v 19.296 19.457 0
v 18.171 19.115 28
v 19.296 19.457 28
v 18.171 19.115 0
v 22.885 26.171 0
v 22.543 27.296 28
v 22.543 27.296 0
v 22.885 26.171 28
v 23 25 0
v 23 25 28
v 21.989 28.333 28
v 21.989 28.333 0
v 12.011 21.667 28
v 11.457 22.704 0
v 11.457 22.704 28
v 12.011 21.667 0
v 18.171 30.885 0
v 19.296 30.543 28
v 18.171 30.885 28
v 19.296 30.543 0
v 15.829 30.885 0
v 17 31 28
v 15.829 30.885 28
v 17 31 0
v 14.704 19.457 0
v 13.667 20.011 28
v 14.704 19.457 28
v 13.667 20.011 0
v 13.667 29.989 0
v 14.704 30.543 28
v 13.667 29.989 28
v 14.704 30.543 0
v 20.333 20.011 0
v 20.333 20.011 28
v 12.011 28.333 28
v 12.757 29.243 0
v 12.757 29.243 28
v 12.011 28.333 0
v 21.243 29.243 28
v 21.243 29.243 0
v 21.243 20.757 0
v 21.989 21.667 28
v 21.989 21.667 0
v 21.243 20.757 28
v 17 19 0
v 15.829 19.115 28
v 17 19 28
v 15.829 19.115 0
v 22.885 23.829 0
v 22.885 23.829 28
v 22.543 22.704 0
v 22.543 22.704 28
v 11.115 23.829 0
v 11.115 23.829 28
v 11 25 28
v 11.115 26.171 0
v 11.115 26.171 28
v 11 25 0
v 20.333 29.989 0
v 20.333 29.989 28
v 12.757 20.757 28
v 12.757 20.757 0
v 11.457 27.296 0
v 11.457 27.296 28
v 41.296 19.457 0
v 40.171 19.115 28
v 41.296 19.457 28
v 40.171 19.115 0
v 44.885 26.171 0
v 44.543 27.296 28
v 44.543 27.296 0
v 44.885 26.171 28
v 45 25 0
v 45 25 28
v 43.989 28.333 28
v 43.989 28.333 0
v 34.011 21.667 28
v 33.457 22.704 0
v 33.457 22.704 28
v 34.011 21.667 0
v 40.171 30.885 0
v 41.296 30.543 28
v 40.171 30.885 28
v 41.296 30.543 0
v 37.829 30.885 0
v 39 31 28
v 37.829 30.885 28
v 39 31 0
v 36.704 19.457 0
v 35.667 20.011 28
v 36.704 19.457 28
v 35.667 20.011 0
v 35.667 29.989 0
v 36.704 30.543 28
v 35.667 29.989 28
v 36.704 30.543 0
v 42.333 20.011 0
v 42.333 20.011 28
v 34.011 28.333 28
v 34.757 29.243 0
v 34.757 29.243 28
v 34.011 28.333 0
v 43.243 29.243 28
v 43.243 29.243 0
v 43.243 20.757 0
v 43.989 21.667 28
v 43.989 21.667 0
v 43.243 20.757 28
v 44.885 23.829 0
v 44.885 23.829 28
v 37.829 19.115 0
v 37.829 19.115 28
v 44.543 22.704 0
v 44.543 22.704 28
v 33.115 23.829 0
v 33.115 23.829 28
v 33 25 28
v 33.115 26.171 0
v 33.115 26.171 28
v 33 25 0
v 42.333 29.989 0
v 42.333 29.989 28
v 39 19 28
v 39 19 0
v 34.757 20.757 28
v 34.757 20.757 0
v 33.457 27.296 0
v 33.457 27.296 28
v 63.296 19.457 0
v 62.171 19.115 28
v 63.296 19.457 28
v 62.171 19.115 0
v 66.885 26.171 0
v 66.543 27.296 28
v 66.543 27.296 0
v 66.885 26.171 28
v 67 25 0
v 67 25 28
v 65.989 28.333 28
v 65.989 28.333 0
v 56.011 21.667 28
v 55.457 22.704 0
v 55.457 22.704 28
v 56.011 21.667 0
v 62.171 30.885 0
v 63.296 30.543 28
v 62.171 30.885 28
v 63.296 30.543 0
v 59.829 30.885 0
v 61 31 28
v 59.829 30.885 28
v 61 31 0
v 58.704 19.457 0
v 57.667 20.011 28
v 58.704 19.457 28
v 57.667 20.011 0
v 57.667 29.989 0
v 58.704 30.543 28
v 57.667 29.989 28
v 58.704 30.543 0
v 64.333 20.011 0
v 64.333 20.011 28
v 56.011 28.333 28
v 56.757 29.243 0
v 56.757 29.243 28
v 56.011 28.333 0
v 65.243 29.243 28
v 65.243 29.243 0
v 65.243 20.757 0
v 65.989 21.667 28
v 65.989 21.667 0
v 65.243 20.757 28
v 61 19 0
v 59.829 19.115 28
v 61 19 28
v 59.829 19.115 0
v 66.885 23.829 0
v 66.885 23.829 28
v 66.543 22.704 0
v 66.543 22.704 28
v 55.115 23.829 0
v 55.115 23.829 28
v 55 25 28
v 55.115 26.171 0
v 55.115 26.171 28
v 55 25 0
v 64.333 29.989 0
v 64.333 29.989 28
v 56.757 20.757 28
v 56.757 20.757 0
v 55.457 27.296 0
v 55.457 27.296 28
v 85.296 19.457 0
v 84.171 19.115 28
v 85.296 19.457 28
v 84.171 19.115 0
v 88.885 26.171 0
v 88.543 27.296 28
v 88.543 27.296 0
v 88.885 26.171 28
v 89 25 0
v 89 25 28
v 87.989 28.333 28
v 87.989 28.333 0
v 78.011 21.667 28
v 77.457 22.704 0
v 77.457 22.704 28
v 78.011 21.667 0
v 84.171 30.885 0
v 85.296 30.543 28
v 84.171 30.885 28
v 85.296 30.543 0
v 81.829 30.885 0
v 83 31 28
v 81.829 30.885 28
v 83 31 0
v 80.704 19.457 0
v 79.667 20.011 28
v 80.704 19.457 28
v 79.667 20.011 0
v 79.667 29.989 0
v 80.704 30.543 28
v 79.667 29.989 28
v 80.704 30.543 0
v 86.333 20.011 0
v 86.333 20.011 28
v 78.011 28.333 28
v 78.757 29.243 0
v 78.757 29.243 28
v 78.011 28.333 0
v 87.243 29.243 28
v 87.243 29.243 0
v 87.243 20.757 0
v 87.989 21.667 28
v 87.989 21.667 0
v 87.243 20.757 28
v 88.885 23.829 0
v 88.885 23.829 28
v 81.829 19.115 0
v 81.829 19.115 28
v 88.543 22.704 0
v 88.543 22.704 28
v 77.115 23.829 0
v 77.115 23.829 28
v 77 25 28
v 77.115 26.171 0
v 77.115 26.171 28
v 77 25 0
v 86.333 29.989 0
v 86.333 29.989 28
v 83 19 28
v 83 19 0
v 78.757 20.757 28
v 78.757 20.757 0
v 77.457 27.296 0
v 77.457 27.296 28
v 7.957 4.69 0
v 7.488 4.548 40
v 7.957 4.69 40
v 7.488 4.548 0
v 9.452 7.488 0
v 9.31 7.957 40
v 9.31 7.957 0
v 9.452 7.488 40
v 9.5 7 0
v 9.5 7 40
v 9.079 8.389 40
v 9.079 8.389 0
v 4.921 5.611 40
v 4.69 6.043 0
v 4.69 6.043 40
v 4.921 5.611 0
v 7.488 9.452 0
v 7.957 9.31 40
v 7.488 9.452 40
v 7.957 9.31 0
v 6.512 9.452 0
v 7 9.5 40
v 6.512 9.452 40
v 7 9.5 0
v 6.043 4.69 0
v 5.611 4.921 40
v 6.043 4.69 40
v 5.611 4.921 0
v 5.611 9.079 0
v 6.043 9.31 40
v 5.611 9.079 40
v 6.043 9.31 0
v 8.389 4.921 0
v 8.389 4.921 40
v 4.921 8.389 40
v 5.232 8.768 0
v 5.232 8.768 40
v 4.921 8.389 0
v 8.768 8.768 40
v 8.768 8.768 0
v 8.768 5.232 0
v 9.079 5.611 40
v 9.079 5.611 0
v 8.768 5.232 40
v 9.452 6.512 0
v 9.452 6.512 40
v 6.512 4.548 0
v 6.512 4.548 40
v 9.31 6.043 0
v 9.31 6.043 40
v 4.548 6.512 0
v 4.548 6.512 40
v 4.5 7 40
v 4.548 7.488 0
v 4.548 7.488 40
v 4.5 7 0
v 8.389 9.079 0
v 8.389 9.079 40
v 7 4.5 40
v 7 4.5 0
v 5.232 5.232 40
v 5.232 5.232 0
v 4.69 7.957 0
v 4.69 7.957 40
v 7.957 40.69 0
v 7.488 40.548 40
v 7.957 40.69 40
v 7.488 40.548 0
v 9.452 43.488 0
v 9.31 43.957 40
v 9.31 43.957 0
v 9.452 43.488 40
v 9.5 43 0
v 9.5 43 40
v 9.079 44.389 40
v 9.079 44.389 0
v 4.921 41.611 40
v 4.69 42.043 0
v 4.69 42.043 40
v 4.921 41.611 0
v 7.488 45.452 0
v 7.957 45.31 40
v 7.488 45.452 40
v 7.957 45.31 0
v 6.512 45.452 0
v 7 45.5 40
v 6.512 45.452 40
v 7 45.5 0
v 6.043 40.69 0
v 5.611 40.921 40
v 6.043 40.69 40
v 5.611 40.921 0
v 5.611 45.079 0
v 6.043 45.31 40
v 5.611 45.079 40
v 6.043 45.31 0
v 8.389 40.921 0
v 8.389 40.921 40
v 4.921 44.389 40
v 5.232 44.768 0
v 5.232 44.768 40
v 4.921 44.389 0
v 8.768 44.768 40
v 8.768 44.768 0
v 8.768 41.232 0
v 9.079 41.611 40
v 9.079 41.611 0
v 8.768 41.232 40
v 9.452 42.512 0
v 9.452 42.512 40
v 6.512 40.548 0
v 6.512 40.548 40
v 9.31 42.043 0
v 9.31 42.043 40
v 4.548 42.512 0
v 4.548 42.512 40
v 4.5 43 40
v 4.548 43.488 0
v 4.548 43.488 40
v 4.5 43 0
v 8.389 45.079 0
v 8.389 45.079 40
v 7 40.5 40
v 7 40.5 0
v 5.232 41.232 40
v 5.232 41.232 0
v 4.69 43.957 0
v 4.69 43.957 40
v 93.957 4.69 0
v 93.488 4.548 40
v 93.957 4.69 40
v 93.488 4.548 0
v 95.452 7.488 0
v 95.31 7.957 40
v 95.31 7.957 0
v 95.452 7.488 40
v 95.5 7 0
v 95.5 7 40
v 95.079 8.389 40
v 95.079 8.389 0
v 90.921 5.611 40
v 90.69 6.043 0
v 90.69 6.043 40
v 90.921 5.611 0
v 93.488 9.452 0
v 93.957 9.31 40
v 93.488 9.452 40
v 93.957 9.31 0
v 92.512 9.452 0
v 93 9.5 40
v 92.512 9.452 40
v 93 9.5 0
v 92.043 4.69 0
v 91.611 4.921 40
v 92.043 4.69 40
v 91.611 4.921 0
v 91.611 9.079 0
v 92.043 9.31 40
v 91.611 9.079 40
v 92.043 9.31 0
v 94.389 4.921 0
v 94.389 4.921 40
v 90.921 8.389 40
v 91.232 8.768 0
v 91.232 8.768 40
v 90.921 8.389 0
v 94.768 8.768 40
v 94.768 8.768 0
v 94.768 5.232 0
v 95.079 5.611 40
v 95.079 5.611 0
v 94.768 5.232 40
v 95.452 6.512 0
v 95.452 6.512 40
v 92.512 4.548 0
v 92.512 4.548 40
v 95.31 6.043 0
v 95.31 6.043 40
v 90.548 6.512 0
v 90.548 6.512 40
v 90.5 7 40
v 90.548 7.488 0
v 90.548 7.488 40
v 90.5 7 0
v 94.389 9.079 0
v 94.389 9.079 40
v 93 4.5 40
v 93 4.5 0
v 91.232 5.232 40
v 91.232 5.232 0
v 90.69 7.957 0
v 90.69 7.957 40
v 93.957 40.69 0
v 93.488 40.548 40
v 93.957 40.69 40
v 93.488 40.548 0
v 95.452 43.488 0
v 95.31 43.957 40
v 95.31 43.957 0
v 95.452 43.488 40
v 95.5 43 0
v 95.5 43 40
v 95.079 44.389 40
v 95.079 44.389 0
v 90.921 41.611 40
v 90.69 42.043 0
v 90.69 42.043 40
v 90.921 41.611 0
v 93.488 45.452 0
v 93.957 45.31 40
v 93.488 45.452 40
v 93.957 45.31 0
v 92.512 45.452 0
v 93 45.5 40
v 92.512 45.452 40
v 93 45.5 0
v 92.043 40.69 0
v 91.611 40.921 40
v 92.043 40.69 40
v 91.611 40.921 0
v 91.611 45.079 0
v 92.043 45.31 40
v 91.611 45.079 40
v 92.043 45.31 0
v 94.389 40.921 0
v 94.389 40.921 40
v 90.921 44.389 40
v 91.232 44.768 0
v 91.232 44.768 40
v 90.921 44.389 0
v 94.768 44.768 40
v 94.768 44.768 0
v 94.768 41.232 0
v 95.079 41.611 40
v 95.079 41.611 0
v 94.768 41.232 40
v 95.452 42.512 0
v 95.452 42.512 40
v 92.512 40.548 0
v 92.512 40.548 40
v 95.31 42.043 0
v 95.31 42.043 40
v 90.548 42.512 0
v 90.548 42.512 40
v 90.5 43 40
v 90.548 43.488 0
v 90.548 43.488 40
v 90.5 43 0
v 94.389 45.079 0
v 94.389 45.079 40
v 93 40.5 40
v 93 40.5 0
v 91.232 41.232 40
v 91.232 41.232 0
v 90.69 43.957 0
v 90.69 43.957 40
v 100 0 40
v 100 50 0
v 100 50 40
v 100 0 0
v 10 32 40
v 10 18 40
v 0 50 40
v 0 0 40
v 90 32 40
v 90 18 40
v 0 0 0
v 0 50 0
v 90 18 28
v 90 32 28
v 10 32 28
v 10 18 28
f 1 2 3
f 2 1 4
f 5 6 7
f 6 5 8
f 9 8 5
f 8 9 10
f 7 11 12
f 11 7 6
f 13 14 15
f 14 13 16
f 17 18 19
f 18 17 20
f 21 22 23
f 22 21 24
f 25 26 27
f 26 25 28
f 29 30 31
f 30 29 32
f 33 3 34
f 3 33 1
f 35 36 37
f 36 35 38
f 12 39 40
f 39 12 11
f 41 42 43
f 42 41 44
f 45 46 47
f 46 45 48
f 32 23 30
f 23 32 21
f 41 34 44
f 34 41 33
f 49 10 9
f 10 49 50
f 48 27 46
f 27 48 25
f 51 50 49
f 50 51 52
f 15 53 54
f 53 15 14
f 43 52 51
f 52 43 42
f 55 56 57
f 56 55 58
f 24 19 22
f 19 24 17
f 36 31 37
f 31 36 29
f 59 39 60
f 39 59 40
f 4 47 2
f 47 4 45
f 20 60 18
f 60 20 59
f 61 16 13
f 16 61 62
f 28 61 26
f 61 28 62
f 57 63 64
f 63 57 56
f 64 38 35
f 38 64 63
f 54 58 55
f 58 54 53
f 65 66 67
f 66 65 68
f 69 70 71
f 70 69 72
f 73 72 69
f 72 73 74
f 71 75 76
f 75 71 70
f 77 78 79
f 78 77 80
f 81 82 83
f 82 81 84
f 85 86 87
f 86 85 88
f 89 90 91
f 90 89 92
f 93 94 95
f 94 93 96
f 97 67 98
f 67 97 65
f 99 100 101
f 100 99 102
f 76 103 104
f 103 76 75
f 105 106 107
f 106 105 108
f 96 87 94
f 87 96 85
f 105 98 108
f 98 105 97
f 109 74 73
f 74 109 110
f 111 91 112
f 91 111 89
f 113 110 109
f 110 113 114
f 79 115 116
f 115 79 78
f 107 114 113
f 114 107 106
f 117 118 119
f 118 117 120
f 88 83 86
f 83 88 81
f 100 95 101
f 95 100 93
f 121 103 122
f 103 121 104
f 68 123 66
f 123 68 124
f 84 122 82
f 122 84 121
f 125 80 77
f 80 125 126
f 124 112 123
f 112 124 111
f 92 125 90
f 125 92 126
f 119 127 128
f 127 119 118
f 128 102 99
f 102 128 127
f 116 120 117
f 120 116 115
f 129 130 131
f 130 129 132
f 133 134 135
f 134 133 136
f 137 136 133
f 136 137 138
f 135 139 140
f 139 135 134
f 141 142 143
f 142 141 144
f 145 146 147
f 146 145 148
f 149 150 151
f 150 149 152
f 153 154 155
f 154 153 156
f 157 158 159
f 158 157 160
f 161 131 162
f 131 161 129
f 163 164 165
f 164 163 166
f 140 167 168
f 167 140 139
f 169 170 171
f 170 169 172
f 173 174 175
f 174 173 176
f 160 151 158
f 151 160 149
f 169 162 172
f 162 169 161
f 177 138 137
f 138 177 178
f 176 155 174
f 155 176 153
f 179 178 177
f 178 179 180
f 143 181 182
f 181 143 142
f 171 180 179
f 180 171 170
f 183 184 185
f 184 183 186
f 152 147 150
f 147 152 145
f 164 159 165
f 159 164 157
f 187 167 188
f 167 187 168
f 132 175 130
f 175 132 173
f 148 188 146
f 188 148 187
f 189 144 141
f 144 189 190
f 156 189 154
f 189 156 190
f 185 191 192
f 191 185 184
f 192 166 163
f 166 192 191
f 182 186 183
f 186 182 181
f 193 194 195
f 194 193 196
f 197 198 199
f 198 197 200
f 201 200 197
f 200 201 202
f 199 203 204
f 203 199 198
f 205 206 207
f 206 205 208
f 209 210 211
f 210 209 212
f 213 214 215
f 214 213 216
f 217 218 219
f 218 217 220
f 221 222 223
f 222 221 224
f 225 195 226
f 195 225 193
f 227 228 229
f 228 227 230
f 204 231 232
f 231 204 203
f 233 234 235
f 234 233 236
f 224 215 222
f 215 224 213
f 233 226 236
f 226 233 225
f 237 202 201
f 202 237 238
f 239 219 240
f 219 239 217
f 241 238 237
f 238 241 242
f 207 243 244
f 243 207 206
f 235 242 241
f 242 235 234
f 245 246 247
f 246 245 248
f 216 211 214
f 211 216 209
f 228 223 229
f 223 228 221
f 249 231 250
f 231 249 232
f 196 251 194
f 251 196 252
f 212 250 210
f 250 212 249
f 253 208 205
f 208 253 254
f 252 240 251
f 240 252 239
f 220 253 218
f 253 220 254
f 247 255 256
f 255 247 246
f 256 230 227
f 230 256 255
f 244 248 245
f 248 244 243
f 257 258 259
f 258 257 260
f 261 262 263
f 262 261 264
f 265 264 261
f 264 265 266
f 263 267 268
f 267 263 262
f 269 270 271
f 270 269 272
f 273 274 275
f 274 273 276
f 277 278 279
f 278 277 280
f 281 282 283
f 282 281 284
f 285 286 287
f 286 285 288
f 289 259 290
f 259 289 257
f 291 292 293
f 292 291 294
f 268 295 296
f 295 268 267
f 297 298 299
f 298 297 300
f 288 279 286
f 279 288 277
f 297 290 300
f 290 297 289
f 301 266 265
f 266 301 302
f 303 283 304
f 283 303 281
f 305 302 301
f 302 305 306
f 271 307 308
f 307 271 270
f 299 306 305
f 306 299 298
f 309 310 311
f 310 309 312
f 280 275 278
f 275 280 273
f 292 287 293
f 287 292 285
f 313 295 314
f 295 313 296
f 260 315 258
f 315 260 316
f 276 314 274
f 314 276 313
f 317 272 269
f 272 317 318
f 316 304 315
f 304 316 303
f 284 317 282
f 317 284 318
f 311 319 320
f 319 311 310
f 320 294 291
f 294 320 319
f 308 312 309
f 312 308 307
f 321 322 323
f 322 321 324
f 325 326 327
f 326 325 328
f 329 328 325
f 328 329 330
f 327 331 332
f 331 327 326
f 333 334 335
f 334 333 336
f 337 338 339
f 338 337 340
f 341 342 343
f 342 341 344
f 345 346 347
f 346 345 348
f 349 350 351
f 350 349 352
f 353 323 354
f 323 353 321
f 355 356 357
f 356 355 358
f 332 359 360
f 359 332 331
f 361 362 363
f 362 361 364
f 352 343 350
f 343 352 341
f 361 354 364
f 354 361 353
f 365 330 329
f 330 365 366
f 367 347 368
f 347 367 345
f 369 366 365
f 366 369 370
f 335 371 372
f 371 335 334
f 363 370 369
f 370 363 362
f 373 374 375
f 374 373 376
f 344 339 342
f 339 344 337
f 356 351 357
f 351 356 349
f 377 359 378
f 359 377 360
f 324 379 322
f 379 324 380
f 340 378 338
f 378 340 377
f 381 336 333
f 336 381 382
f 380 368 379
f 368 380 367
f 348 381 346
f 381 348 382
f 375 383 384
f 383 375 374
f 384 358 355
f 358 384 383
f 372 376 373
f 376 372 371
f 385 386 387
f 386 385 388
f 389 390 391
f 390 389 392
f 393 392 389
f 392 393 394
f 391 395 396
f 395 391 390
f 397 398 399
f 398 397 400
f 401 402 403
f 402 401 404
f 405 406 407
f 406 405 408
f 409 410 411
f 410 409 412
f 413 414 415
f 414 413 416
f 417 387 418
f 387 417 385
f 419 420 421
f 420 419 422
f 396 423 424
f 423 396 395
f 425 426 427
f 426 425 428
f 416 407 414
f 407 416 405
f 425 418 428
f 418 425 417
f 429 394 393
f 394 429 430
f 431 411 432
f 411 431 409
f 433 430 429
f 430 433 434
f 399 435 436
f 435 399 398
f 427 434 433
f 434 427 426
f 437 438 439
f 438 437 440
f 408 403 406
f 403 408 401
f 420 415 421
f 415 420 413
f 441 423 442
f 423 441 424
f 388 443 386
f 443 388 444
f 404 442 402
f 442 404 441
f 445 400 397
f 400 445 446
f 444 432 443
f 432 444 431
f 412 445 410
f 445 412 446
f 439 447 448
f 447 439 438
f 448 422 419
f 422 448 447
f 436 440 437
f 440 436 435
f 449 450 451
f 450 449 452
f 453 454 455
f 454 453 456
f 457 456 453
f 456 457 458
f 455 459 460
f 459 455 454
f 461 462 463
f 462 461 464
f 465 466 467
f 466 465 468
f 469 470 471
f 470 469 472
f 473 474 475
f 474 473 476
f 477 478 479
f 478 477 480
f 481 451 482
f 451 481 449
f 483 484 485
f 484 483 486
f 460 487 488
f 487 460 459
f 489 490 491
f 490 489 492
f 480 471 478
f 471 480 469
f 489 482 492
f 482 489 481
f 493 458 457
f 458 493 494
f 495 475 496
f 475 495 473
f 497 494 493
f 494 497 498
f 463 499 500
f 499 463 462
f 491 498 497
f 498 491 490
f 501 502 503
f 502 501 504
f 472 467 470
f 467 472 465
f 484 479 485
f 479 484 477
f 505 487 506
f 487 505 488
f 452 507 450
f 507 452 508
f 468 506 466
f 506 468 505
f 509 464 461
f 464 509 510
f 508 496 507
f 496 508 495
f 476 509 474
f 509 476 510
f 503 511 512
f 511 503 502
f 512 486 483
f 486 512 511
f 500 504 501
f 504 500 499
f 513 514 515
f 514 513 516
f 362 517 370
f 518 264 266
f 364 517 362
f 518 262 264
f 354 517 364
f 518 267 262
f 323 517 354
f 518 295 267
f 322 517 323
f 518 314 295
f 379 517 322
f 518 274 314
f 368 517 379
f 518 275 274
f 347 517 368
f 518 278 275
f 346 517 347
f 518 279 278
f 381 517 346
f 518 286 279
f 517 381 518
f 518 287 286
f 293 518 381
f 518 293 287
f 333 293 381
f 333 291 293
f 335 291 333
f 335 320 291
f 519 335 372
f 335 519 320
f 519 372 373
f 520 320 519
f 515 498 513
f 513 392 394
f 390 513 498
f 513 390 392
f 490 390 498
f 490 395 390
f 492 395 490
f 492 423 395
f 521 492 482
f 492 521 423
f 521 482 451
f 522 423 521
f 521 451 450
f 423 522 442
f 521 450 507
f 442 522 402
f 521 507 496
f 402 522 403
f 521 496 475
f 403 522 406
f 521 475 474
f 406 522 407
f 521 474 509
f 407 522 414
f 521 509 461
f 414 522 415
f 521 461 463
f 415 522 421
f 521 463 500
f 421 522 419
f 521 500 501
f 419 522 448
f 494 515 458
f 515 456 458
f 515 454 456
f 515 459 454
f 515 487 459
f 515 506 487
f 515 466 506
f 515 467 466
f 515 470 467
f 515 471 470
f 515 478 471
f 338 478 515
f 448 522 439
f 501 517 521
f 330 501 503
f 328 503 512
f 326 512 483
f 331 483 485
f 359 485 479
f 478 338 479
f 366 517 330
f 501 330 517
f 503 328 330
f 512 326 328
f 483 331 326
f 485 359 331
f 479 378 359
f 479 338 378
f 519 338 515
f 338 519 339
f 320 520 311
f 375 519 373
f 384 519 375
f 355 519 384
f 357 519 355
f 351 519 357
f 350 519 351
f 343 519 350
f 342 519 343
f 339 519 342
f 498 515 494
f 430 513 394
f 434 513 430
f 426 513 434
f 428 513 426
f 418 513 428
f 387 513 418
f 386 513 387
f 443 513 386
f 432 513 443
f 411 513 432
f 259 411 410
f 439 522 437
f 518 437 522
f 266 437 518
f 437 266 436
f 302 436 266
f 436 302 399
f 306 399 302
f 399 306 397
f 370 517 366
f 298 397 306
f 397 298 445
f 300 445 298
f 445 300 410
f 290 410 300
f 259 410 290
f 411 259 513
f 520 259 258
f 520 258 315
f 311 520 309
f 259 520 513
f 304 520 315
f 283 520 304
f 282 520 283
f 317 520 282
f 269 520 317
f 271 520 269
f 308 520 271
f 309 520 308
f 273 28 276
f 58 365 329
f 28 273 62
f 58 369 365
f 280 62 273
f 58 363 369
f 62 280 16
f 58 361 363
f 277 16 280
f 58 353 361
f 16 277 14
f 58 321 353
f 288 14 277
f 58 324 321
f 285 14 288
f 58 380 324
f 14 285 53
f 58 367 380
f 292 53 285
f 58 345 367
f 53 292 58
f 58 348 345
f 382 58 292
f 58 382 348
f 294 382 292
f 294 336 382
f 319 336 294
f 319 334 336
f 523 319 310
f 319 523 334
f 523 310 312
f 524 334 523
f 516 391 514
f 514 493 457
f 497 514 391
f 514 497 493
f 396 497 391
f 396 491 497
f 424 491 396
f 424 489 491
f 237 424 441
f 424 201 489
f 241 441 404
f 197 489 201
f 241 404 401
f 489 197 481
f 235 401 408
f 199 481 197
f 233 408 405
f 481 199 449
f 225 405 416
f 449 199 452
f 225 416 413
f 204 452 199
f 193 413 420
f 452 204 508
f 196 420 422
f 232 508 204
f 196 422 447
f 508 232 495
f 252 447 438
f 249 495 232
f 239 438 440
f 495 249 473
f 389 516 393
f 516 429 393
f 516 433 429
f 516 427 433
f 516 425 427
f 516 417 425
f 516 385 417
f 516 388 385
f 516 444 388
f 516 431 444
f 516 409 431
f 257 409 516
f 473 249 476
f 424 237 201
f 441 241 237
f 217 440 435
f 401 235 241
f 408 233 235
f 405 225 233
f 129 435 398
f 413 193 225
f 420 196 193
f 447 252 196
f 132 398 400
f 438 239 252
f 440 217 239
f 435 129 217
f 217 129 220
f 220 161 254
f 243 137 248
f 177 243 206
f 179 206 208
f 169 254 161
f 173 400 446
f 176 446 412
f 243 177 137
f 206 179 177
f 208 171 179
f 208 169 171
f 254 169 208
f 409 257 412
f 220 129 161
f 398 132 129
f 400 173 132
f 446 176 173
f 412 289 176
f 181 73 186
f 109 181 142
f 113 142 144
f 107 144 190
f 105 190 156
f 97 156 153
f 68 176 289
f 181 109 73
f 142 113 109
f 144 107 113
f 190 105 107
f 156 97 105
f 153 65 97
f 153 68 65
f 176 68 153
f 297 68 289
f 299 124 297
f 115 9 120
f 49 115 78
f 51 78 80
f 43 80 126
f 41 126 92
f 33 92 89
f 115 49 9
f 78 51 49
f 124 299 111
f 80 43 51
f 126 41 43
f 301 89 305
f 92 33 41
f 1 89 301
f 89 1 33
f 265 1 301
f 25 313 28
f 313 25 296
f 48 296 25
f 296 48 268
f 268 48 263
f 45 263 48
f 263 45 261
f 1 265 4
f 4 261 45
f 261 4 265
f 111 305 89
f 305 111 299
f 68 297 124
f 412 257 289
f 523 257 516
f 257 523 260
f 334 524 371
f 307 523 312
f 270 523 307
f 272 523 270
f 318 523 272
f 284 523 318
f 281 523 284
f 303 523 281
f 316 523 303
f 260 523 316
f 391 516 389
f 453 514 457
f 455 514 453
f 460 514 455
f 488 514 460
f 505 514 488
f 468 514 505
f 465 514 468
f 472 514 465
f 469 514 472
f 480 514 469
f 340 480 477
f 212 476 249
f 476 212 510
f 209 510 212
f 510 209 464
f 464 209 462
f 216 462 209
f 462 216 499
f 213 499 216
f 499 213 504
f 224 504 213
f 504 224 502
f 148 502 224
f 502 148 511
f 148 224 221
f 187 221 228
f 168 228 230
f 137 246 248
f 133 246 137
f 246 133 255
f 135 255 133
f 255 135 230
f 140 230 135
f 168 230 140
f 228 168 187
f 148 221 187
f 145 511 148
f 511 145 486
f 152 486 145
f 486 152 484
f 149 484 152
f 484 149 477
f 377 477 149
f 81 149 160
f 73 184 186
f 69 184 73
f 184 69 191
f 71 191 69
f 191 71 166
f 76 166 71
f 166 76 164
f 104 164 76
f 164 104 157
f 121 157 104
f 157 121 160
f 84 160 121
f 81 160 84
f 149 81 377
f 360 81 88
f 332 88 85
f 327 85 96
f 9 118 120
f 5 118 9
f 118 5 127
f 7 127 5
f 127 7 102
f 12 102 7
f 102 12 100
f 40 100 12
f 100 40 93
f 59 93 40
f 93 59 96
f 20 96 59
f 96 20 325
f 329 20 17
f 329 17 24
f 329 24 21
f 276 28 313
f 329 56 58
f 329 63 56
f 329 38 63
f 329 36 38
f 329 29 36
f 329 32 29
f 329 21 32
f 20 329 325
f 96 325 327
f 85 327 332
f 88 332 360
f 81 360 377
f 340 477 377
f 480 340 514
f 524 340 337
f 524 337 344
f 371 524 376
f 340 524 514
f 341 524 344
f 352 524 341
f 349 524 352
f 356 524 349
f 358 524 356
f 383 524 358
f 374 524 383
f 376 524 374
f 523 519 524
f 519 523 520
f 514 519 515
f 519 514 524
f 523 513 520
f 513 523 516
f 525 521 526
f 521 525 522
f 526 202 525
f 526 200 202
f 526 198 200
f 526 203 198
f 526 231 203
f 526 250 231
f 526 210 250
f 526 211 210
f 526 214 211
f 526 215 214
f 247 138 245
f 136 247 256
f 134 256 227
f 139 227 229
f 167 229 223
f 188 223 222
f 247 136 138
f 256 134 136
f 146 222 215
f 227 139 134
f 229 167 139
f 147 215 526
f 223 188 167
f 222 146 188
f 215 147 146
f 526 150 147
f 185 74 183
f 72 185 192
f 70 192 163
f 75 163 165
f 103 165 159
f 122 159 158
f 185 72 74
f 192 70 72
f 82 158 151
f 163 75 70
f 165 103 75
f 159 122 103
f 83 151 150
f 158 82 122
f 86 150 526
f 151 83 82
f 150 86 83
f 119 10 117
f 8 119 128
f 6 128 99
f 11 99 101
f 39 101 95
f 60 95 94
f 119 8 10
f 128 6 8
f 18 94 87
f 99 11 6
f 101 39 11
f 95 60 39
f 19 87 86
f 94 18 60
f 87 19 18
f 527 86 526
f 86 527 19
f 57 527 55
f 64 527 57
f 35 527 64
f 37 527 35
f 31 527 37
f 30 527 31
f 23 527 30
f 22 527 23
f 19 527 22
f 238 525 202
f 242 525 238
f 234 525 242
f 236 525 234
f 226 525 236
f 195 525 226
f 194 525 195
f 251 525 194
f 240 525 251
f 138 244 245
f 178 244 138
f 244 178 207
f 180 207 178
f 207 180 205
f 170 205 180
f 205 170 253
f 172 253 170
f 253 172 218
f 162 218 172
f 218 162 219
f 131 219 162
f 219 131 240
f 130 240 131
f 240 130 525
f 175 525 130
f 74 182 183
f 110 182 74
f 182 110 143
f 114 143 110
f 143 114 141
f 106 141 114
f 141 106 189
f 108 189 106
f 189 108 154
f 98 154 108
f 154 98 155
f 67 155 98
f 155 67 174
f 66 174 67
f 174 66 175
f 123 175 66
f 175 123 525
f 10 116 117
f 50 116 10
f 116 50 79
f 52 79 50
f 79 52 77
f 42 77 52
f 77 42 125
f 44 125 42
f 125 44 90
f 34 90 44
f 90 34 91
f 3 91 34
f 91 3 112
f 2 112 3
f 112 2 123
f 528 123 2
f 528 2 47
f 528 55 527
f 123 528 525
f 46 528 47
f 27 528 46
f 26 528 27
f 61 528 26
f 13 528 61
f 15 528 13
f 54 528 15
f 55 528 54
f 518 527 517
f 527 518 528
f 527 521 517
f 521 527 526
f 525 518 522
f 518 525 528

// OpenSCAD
$fn = 32;

// ----------------------------------------------------------------------
// Manifold block: gallery_top manifold
// ----------------------------------------------------------------------

// --- parameters (mm) ---
block_l = 100;            // block length, X
block_w = 50;             // block width, Y
block_h = 40;             // block height, Z
port_d = 12;              // port bore diameter
port_pitch = 22;          // port pitch along X
gallery_d = 14;           // top gallery width, Y
gallery_depth = 12;       // gallery pocket depth
wall_p = 10;              // gallery end wall thickness, X
mnt_d = 5;                // mounting hole diameter
mnt_in = 7;               // mounting hole inset from the edges
fit_tol = 0.1;            // tolerance for press fits, mm
free_tol = 0.5;           // tolerance for clearance fits, mm

n_ports = 4;  // ports in the row
port_x0 = (block_l - (n_ports - 1) * port_pitch) / 2;  // first port X

difference() {
  cube([block_l, block_w, block_h]);
  for (i = [0 : n_ports - 1])
    translate([port_x0 + i * port_pitch, block_w / 2, -1])
      cylinder(h = block_h + 2, d = port_d);
  translate([wall_p, block_w / 2 - gallery_d / 2, block_h - gallery_depth])
    cube([block_l - 2 * wall_p, gallery_d, gallery_depth + 1]);
  for (cx = [mnt_in, block_l - mnt_in])
    for (cy = [mnt_in, block_w - mnt_in])
      translate([cx, cy, -1]) cylinder(h = block_h + 2, d = mnt_d);
}
